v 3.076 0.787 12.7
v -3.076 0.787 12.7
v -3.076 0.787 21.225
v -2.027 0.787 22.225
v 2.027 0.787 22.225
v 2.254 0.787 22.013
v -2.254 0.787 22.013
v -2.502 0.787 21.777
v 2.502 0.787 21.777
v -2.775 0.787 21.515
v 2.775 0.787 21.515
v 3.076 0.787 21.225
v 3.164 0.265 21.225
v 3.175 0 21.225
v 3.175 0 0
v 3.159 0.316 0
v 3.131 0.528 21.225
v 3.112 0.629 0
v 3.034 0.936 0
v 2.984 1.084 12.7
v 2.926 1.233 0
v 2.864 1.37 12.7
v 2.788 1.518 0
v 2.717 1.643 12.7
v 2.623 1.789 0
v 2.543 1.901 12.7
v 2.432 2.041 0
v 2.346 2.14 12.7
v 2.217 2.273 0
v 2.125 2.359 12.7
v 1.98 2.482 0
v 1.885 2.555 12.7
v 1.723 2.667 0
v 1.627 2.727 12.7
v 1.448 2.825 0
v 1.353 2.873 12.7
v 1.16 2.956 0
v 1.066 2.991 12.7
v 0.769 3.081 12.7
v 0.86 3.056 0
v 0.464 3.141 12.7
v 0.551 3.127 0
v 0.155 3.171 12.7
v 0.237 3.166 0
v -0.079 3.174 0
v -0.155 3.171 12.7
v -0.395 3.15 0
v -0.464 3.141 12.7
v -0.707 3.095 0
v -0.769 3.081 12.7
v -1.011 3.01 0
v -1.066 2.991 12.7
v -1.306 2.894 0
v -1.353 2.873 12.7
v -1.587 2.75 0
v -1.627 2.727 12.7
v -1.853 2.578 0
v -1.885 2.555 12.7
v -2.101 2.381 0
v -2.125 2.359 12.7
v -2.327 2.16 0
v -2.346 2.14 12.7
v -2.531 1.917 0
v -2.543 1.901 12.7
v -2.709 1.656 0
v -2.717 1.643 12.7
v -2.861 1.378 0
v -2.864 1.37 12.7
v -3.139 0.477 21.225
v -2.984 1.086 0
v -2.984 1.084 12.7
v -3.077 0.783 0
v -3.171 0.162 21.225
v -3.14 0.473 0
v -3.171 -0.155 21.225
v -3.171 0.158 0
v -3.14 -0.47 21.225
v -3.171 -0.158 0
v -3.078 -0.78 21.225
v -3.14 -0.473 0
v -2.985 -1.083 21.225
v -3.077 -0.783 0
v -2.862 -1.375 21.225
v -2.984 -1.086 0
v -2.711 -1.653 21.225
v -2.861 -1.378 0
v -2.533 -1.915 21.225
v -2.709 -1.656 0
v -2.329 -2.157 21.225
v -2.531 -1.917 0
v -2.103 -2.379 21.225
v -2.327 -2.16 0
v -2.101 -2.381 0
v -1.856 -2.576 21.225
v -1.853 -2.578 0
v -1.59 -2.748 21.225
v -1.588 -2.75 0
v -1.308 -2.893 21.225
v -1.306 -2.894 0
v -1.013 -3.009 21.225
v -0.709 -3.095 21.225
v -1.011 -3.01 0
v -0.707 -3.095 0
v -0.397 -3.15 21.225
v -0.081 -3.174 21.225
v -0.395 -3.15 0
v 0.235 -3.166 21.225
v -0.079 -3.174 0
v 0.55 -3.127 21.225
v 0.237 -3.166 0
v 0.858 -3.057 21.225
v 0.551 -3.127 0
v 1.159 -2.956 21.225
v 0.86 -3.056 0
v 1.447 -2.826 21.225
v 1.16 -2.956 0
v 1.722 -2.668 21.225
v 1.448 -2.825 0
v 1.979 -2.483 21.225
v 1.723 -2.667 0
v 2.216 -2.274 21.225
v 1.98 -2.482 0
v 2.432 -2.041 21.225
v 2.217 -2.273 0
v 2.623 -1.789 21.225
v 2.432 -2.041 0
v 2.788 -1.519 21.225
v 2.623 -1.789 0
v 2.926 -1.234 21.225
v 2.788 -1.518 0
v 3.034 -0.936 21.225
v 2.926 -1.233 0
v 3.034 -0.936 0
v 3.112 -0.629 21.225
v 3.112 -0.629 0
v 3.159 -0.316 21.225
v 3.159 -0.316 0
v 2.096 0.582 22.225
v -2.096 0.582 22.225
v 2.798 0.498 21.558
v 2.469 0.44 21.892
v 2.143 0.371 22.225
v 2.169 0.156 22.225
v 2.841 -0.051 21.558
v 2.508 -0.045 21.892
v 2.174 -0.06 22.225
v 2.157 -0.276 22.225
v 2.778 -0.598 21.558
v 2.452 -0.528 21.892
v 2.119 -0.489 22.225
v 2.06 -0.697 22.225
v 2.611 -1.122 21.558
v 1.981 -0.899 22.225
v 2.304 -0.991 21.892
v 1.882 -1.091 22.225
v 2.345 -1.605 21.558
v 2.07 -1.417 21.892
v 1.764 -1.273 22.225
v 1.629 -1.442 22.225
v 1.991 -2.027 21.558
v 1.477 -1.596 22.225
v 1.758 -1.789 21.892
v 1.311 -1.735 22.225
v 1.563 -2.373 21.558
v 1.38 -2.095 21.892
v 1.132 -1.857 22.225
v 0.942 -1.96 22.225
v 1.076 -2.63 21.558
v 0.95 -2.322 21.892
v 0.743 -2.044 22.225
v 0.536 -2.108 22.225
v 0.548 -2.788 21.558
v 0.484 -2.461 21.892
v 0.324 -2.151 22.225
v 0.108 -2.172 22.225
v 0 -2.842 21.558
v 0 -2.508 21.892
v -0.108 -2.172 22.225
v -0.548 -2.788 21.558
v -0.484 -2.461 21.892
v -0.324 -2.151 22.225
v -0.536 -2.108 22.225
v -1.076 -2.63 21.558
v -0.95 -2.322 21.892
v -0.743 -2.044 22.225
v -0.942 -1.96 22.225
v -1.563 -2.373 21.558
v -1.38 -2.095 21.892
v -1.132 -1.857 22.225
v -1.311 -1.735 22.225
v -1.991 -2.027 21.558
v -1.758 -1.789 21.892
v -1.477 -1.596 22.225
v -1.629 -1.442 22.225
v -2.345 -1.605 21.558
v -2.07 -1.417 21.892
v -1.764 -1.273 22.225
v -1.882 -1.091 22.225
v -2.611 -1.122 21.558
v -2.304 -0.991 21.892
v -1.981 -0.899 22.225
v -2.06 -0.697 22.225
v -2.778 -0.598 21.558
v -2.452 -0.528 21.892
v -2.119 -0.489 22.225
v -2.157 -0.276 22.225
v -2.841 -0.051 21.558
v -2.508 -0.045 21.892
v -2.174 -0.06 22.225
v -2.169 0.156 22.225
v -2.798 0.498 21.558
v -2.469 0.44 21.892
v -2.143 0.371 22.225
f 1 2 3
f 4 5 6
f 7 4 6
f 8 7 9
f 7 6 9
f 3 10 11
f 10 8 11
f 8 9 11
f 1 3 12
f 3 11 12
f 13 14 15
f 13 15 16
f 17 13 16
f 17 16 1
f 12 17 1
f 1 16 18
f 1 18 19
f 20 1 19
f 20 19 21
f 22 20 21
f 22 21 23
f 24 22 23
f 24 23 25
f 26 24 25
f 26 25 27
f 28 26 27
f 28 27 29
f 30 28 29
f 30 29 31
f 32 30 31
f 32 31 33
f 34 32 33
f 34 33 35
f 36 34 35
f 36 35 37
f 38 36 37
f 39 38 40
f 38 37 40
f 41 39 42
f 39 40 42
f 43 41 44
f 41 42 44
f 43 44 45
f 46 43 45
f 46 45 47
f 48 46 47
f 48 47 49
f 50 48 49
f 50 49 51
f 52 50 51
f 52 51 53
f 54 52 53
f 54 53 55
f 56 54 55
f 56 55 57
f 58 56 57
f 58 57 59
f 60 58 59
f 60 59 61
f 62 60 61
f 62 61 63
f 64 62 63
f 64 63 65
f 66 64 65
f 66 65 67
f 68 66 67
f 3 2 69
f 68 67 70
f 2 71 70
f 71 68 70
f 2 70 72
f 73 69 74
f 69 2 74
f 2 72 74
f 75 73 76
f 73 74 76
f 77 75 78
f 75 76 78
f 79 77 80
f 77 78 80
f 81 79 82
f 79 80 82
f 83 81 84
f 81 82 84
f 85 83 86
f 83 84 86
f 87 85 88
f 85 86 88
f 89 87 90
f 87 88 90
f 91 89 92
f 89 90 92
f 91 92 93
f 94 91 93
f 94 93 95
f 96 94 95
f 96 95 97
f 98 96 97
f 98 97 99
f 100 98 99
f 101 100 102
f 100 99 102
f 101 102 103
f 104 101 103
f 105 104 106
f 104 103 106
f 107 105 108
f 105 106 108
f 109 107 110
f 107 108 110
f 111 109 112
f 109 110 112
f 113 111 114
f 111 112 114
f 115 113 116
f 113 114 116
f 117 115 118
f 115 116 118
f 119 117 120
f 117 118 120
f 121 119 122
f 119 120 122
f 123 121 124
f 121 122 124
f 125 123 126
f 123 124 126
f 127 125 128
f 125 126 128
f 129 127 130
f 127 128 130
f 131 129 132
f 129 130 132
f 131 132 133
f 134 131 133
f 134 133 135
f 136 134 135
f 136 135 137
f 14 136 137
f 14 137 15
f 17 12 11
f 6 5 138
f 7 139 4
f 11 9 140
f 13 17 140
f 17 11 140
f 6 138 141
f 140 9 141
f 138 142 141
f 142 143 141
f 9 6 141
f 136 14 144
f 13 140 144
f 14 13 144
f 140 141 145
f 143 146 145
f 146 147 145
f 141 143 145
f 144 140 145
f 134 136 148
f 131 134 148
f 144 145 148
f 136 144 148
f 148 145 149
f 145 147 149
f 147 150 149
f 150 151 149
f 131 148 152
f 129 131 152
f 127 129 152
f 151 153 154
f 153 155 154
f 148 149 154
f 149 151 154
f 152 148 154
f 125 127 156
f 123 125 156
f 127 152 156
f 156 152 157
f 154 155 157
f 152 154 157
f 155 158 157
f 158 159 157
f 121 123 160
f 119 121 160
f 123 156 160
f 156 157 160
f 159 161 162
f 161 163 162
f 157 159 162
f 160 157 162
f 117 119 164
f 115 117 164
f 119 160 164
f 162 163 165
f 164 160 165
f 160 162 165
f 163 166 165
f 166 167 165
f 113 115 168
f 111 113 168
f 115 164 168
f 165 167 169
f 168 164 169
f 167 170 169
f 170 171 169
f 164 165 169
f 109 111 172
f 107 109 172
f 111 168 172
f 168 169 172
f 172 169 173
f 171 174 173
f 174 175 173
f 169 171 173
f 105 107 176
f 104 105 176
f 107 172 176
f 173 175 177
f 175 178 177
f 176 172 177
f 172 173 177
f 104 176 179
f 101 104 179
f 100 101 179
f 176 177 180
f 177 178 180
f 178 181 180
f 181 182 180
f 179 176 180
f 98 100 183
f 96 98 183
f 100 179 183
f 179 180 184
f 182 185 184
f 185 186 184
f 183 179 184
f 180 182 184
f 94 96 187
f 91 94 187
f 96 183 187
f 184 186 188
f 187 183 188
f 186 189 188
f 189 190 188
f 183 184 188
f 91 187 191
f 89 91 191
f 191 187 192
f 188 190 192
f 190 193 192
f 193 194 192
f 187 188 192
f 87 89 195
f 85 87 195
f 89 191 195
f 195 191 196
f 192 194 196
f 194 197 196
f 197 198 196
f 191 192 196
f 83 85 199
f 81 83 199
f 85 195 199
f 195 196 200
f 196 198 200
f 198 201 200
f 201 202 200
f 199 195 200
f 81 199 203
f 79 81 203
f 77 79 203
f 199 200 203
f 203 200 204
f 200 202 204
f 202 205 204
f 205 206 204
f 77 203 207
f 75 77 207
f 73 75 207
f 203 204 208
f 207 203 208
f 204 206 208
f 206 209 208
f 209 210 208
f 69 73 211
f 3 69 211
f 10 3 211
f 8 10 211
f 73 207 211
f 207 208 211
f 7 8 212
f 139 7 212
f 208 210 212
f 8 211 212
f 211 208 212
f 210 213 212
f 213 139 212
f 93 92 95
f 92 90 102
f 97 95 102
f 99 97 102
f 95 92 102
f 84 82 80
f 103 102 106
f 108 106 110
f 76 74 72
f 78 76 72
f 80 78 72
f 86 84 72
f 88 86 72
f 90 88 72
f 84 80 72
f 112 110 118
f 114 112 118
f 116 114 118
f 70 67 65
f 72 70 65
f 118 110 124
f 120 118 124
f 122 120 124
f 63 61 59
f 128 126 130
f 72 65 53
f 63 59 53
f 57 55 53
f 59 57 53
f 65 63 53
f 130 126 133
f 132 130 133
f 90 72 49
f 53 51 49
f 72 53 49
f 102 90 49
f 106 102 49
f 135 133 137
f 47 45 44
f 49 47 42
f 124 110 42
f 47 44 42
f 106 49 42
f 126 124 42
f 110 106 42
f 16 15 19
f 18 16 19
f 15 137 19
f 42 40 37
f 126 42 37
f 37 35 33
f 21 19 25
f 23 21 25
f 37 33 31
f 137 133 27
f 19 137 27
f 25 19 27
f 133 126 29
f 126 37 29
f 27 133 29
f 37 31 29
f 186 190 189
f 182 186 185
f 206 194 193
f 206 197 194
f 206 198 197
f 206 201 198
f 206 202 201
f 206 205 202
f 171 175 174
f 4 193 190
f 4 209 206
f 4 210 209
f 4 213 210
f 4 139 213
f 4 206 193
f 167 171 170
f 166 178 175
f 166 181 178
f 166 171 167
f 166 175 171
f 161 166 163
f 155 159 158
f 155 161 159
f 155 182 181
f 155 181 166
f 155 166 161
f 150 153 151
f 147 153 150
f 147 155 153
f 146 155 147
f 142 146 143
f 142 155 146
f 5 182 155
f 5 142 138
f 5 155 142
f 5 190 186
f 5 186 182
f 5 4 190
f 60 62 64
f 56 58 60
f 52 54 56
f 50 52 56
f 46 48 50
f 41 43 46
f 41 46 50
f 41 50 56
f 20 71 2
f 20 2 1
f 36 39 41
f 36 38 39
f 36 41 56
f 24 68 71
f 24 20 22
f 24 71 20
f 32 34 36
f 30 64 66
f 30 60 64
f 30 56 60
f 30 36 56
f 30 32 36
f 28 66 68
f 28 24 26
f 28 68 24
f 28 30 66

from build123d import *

# Parameters (mm, degrees)
SKETCH1_R               = 3.175
BOSS_EXTRUDE1_DEPTH     = 22.225
CUT_EXTRUDE1_DEPTH      = 1
CUT_EXTRUDE1_DEPTH_BACK = 9.525
CHAMFER1_SIZE           = 1


with BuildPart() as part:
    # Sketch1 → Boss-Extrude1 (new body)
    with BuildSketch(Plane.XY):
        Circle(SKETCH1_R)
    extrude(amount=BOSS_EXTRUDE1_DEPTH)

    # Sketch3 → Cut-Extrude1 (cut, two sides)
    with BuildSketch(Plane.XY.offset(22.225)) as cut_extrude1_sk:
        Polygon((-27.877607345, 0.7874), (-3.075813102, 0.7874), (3.075813102, 0.7874), (27.877607345, 0.7874), (27.877607345, 50.390988485), (-27.877607345, 50.390988485), align=None)
    extrude(amount=CUT_EXTRUDE1_DEPTH, mode=Mode.SUBTRACT)
    extrude(cut_extrude1_sk.sketch, amount=-CUT_EXTRUDE1_DEPTH_BACK, mode=Mode.SUBTRACT)

    # Chamfer1
    chamfer1_edges = [part.edges().sort_by_distance(p)[0] for p in [
        (-0.39681129, -3.150105681, 22.225),
    ]]
    chamfer(chamfer1_edges, length=CHAMFER1_SIZE)


solid = part.part
